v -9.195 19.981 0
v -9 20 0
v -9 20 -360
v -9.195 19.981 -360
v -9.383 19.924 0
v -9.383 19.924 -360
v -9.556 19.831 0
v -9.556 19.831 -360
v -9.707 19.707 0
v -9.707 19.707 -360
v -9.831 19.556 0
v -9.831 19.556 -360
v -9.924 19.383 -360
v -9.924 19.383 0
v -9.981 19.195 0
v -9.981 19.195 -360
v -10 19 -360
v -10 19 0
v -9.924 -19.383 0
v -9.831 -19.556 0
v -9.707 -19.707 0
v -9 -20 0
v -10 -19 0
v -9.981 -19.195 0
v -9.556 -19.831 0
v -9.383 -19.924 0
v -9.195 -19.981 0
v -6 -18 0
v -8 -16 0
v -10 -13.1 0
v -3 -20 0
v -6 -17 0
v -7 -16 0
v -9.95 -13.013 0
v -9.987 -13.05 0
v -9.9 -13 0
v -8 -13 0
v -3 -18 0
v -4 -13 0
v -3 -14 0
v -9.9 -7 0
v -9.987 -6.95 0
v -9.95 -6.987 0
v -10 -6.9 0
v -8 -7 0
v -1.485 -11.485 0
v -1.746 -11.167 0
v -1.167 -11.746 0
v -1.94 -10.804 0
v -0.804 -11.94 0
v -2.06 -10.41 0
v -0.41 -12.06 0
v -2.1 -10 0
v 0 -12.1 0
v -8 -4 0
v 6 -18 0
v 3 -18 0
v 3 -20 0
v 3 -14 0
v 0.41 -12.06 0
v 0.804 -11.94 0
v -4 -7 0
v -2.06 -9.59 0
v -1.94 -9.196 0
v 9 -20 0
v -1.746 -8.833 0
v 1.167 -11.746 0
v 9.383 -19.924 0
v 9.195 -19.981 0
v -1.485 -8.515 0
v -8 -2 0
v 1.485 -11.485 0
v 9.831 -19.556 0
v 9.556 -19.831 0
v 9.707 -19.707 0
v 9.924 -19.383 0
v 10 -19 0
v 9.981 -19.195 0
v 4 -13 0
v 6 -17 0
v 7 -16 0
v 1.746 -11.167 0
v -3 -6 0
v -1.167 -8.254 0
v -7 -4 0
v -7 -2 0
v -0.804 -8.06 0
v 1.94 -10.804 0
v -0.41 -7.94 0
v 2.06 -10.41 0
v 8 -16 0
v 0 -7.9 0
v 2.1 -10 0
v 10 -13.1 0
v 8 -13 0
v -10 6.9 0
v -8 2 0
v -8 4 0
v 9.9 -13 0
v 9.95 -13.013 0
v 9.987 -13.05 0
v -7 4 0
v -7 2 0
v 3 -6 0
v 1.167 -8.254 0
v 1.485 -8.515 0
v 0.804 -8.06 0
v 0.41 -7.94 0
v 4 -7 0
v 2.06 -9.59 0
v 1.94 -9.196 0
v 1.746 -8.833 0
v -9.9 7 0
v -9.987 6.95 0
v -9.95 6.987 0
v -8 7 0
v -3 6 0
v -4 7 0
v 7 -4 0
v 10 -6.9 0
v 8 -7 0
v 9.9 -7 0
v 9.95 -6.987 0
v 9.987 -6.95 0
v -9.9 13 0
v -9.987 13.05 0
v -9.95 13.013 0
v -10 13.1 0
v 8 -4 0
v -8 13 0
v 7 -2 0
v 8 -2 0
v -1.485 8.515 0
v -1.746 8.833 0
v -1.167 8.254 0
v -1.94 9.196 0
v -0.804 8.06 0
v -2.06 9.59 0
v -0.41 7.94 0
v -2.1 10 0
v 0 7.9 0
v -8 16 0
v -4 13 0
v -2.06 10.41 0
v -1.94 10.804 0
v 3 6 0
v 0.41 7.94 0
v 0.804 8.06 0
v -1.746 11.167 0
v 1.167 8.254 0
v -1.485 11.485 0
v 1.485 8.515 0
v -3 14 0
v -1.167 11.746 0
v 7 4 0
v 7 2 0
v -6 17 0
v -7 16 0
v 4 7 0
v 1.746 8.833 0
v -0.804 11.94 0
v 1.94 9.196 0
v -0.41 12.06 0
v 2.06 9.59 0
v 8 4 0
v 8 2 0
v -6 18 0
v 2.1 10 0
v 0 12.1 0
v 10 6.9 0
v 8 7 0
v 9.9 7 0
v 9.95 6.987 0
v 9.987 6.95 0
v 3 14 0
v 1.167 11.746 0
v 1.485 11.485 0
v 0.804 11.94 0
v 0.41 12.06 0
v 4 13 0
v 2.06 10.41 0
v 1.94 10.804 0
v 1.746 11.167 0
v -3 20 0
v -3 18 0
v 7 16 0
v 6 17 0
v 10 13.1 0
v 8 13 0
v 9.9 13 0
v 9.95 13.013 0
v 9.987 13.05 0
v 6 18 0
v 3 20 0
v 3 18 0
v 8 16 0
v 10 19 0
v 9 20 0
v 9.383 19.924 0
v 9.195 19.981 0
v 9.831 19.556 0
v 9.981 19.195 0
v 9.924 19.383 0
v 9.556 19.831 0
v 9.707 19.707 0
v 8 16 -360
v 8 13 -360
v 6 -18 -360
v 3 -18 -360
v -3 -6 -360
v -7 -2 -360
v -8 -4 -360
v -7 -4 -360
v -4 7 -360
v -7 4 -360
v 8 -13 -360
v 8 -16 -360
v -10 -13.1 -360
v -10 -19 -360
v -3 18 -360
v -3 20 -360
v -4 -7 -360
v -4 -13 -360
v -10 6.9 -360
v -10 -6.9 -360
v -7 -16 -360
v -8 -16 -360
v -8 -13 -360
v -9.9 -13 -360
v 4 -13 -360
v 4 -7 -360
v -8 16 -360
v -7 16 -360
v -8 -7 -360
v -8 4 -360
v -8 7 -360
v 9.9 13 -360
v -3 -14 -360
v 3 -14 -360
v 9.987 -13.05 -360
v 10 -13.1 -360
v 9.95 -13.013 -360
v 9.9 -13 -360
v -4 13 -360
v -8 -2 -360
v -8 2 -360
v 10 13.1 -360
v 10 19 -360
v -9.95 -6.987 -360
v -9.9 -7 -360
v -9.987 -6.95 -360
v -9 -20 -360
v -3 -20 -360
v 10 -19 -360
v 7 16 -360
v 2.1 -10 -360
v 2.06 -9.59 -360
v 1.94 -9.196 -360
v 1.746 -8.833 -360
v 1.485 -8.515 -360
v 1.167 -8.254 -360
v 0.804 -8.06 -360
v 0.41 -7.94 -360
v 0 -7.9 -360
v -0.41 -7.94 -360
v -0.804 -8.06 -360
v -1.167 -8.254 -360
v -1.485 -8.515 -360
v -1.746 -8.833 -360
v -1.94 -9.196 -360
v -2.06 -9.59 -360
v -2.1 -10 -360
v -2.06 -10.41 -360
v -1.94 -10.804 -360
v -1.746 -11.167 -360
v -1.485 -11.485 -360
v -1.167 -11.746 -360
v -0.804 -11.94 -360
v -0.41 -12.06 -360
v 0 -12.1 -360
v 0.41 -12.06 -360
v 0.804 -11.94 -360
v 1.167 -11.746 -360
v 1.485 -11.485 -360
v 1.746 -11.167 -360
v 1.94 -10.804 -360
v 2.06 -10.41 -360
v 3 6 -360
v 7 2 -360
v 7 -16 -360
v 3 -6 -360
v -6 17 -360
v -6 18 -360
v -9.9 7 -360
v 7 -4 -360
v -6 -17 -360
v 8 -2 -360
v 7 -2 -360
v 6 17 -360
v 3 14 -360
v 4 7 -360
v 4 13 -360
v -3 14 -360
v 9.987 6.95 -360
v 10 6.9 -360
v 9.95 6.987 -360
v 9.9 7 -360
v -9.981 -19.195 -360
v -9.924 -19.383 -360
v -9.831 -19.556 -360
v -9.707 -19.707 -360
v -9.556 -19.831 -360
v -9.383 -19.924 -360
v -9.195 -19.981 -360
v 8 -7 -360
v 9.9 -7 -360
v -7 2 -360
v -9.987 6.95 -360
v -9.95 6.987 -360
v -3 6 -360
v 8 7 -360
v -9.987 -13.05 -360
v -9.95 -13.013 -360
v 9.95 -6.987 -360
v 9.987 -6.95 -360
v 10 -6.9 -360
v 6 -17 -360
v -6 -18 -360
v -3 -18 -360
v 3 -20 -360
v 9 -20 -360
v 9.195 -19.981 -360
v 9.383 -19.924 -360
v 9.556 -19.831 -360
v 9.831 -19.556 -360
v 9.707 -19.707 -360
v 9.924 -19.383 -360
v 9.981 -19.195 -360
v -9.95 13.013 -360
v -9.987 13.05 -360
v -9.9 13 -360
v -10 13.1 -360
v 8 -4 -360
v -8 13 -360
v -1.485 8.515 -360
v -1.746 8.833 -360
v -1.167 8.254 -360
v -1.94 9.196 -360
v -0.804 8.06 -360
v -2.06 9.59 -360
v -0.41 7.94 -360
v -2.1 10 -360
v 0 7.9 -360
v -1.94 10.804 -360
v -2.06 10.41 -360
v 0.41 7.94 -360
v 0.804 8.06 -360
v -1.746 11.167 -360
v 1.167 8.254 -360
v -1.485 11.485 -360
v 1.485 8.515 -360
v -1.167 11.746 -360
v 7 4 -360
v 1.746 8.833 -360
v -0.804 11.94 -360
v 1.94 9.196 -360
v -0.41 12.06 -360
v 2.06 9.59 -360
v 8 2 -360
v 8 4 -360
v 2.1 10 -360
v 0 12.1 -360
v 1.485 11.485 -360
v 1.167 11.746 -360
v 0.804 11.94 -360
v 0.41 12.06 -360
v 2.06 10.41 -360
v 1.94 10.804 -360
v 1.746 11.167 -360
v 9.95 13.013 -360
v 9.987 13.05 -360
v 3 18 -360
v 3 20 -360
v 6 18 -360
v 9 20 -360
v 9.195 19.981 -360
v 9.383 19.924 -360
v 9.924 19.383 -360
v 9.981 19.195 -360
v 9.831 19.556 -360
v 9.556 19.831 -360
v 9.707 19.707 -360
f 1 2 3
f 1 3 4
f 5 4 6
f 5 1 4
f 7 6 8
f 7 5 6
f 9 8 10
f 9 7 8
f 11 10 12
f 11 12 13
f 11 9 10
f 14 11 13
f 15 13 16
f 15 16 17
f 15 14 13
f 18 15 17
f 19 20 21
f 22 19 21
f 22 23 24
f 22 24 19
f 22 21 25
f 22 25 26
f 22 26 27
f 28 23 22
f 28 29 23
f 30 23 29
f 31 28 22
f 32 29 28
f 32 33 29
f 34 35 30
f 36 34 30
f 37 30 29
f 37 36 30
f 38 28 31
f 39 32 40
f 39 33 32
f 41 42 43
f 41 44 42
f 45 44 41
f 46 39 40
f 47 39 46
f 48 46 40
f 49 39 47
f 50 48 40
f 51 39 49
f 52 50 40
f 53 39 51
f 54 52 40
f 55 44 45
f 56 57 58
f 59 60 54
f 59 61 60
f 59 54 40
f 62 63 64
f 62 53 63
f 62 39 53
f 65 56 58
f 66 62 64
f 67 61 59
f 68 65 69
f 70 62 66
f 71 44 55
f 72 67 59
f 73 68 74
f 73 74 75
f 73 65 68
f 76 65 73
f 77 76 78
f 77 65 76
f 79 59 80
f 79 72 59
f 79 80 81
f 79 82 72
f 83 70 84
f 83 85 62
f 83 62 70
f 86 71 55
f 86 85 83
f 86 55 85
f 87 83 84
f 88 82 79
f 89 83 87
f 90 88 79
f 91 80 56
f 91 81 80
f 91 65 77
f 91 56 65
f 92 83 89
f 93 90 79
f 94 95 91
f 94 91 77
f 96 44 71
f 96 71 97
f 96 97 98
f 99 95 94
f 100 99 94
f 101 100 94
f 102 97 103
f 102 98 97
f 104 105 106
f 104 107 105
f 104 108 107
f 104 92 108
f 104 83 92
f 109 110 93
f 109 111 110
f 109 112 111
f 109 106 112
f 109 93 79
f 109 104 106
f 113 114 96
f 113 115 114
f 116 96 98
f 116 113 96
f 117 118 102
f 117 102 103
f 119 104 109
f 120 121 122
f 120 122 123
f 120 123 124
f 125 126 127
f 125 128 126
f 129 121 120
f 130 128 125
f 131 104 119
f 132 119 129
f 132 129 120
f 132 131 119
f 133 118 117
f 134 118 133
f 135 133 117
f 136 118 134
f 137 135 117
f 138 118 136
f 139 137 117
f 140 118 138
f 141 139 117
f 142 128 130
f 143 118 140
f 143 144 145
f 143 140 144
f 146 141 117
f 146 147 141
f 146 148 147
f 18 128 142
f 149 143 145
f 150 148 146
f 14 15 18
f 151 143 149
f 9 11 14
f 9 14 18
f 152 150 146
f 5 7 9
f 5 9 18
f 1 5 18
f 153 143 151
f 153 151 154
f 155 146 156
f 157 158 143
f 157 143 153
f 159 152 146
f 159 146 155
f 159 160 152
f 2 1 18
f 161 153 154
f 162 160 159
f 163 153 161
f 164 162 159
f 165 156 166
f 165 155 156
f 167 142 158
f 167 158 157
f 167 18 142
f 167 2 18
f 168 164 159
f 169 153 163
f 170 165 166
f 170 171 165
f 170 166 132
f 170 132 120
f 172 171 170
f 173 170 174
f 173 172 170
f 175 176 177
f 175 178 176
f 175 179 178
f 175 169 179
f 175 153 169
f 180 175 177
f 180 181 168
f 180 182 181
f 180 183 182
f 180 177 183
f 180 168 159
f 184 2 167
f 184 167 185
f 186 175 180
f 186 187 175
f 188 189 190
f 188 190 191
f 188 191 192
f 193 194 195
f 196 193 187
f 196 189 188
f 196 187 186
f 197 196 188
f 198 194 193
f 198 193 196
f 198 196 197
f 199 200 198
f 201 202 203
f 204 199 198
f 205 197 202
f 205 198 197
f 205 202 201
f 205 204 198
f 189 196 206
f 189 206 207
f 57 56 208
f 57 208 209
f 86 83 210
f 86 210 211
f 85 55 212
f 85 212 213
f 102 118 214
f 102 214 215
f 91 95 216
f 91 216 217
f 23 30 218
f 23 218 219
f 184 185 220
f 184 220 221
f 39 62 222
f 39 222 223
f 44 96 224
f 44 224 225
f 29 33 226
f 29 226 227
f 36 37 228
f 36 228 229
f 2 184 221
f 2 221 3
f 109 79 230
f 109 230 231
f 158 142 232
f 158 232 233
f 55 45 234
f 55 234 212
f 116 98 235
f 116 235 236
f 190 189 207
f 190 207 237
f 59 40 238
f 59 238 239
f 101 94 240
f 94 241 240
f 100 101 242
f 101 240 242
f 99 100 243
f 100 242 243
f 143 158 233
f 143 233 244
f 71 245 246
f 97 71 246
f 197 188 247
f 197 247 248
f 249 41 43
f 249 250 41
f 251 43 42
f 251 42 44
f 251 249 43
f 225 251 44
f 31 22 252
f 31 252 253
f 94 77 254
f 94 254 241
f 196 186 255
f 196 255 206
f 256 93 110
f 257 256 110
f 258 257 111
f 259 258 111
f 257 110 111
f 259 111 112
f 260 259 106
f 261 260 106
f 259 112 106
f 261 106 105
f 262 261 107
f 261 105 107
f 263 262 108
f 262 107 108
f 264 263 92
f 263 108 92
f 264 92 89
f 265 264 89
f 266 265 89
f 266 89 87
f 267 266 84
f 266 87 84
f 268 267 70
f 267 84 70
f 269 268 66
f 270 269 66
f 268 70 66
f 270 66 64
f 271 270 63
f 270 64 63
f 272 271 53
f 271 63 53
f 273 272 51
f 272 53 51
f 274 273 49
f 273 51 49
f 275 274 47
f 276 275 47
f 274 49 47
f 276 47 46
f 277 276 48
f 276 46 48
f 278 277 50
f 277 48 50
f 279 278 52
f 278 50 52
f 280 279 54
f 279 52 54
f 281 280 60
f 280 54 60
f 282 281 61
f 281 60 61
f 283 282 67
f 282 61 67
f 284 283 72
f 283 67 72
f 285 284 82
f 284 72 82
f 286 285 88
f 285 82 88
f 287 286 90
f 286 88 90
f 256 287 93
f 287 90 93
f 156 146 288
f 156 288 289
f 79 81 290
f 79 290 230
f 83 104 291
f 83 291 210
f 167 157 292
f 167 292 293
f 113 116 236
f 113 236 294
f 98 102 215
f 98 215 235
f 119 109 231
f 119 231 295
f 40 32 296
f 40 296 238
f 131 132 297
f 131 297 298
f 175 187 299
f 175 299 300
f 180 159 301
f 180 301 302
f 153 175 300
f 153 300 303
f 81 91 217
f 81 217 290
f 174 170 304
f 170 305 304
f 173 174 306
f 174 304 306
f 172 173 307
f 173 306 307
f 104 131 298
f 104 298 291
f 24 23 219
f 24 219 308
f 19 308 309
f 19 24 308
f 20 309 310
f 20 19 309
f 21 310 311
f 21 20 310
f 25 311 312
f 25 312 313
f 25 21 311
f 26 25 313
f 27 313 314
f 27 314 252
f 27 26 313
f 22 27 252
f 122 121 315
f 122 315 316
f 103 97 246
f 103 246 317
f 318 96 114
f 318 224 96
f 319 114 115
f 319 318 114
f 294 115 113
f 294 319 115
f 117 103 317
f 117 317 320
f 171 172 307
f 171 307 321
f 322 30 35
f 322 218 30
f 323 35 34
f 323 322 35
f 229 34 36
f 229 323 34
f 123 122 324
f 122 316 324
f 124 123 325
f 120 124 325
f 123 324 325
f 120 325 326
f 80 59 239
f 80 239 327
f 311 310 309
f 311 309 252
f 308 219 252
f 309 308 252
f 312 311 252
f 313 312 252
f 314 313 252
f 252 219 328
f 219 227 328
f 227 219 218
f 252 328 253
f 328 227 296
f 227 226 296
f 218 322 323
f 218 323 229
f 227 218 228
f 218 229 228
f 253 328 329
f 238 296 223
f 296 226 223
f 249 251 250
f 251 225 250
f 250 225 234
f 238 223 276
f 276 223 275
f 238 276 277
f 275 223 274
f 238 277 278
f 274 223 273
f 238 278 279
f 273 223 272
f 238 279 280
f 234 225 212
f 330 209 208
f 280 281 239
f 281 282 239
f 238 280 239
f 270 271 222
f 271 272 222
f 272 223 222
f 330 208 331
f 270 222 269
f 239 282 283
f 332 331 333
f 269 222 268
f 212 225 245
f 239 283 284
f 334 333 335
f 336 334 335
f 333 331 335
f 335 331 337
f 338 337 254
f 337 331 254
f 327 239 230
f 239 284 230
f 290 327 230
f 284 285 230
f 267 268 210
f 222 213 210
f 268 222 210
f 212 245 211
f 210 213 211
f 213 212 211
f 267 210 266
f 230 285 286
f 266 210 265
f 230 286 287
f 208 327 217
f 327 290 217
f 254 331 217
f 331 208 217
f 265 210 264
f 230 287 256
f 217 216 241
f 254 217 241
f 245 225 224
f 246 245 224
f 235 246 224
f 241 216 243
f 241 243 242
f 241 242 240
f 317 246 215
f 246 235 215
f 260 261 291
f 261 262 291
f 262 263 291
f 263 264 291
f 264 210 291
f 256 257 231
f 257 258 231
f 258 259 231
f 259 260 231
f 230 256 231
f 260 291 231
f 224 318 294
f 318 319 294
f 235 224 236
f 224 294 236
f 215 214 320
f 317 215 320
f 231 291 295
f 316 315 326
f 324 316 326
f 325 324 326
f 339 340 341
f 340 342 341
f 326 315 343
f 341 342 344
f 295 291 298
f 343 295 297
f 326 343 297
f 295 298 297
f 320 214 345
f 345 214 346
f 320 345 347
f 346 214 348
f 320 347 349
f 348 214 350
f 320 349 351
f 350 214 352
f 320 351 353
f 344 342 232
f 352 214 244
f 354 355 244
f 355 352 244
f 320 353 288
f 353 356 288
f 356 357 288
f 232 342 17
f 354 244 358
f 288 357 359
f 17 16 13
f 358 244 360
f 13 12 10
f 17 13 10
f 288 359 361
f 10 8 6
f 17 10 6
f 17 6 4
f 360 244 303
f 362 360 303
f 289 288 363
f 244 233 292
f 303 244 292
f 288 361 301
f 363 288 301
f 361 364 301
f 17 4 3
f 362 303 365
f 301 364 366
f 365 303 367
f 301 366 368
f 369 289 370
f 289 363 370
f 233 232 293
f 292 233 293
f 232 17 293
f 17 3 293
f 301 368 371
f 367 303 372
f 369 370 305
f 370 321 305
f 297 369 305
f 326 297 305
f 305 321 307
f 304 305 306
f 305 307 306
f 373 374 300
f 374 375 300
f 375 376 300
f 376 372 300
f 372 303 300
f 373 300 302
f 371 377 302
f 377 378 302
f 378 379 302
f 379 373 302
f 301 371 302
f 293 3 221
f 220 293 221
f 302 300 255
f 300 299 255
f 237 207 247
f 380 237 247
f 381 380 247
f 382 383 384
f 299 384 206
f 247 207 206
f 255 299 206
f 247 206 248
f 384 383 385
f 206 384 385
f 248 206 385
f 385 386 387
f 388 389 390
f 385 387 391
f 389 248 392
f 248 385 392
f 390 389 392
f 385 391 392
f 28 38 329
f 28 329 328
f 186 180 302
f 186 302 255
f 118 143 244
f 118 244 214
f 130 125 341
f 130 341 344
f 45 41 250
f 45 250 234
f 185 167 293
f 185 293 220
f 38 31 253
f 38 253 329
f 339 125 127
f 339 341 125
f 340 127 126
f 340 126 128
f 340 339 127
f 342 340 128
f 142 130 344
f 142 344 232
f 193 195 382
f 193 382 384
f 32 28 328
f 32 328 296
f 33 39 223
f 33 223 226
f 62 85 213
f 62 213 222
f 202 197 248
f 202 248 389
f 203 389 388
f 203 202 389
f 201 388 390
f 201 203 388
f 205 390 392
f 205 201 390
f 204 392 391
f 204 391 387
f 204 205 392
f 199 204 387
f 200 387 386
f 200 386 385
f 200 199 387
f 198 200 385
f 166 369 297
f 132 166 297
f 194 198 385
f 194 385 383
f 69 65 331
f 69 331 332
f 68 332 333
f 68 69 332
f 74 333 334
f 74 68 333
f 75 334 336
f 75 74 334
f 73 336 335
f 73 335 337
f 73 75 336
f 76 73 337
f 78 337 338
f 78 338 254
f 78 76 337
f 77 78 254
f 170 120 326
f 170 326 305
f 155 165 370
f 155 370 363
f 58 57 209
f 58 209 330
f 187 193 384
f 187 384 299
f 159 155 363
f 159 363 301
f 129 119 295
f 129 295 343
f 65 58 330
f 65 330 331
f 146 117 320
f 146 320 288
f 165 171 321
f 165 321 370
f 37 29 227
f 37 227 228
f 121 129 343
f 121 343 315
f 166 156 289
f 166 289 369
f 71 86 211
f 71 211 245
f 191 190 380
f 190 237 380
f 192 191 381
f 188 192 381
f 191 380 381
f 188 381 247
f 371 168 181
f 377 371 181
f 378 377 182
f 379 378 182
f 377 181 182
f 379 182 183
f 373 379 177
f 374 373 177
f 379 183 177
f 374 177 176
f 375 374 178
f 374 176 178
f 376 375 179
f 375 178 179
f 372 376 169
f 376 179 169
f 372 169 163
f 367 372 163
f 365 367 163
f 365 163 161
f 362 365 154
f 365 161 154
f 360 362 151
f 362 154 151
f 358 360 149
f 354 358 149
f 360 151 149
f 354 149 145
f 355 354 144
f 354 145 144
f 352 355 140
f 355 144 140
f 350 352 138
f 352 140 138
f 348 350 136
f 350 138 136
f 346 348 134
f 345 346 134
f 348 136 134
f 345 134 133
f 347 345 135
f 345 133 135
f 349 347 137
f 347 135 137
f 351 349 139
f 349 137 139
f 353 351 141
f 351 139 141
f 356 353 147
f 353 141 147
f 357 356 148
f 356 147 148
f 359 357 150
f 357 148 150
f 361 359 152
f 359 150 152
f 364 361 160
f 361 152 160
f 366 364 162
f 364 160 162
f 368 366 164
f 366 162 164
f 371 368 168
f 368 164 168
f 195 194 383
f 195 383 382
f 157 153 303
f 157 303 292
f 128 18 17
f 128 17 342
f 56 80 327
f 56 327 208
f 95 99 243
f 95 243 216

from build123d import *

# Parameters (mm, degrees)
SKETCH1_R           = 2.1
BOSS_EXTRUDE1_DEPTH = 360
FILLET1_R           = 0.1


with BuildPart() as part:
    # Sketch1 → Boss-Extrude1 (new body)
    with BuildSketch(Plane.XY):
        with BuildLine():
            Line((10, -19), (10, -13))
            Line((10, -13), (8, -13))
            Line((8, -13), (8, -16))
            Line((8, -16), (7, -16))
            Line((7, -16), (4, -13))
            Line((4, -13), (4, -7))
            Line((4, -7), (7, -4))
            Line((7, -4), (8, -4))
            Line((8, -4), (8, -7))
            Line((8, -7), (10, -7))
            Line((10, -7), (10, 7))
            Line((10, 7), (8, 7))
            Line((8, 7), (8, 4))
            Line((8, 4), (7, 4))
            Line((7, 4), (4, 7))
            Line((4, 7), (4, 13))
            Line((4, 13), (7, 16))
            Line((7, 16), (8, 16))
            Line((8, 16), (8, 13))
            Line((8, 13), (10, 13))
            Line((10, 13), (10, 19))
            ThreePointArc((10, 19), (9.707106781, 19.707106781), (9, 20))
            Line((9, 20), (3, 20))
            Line((3, 20), (3, 18))
            Line((3, 18), (6, 18))
            Line((6, 18), (6, 17))
            Line((6, 17), (3, 14))
            Line((3, 14), (-3, 14))
            Line((-3, 14), (-6, 17))
            Line((-6, 17), (-6, 18))
            Line((-6, 18), (-3, 18))
            Line((-3, 18), (-3, 20))
            Line((-3, 20), (-9, 20))
            ThreePointArc((-9, 20), (-9.707106781, 19.707106781), (-10, 19))
            Line((-10, 19), (-10, 13))
            Line((-10, 13), (-8, 13))
            Line((-8, 13), (-8, 16))
            Line((-8, 16), (-7, 16))
            Line((-7, 16), (-4, 13))
            Line((-4, 13), (-4, 7))
            Line((-4, 7), (-7, 4))
            Line((-7, 4), (-8, 4))
            Line((-8, 4), (-8, 7))
            Line((-8, 7), (-10, 7))
            Line((-10, 7), (-10, -7))
            Line((-10, -7), (-8, -7))
            Line((-8, -7), (-8, -4))
            Line((-8, -4), (-7, -4))
            Line((-7, -4), (-4, -7))
            Line((-4, -7), (-4, -13))
            Line((-4, -13), (-7, -16))
            Line((-7, -16), (-8, -16))
            Line((-8, -16), (-8, -13))
            Line((-8, -13), (-10, -13))
            Line((-10, -13), (-10, -19))
            ThreePointArc((-10, -19), (-9.707106781, -19.707106781), (-9, -20))
            Line((-9, -20), (-3, -20))
            Line((-3, -20), (-3, -18))
            Line((-3, -18), (-6, -18))
            Line((-6, -18), (-6, -17))
            Line((-6, -17), (-3, -14))
            Line((-3, -14), (3, -14))
            Line((3, -14), (6, -17))
            Line((6, -17), (6, -18))
            Line((6, -18), (3, -18))
            Line((3, -18), (3, -20))
            Line((3, -20), (9, -20))
            ThreePointArc((9, -20), (9.707106781, -19.707106781), (10, -19))
        make_face()
        with Locations((0, -10)):
            Circle(SKETCH1_R, mode=Mode.SUBTRACT)
        with Locations((0, 10)):
            Circle(SKETCH1_R, mode=Mode.SUBTRACT)
        Polygon((-7, -2), (-8, -2), (-8, 2), (-7, 2), (-3, 6), (3, 6), (7, 2), (8, 2), (8, -2), (7, -2), (3, -6), (-3, -6), align=None, mode=Mode.SUBTRACT)
    extrude(amount=-BOSS_EXTRUDE1_DEPTH)

    # Fillet1
    fillet1_edges = [part.edges().sort_by_distance(p)[0] for p in [
        (-10, -13, -180),
        (-10, -7, -180),
        (-10, 7, -180),
        (-10, 13, -180),
        (10, 13, -180),
        (10, 7, -180),
        (10, -7, -180),
        (10, -13, -180),
    ]]
    fillet(fillet1_edges, radius=FILLET1_R)


solid = part.part
